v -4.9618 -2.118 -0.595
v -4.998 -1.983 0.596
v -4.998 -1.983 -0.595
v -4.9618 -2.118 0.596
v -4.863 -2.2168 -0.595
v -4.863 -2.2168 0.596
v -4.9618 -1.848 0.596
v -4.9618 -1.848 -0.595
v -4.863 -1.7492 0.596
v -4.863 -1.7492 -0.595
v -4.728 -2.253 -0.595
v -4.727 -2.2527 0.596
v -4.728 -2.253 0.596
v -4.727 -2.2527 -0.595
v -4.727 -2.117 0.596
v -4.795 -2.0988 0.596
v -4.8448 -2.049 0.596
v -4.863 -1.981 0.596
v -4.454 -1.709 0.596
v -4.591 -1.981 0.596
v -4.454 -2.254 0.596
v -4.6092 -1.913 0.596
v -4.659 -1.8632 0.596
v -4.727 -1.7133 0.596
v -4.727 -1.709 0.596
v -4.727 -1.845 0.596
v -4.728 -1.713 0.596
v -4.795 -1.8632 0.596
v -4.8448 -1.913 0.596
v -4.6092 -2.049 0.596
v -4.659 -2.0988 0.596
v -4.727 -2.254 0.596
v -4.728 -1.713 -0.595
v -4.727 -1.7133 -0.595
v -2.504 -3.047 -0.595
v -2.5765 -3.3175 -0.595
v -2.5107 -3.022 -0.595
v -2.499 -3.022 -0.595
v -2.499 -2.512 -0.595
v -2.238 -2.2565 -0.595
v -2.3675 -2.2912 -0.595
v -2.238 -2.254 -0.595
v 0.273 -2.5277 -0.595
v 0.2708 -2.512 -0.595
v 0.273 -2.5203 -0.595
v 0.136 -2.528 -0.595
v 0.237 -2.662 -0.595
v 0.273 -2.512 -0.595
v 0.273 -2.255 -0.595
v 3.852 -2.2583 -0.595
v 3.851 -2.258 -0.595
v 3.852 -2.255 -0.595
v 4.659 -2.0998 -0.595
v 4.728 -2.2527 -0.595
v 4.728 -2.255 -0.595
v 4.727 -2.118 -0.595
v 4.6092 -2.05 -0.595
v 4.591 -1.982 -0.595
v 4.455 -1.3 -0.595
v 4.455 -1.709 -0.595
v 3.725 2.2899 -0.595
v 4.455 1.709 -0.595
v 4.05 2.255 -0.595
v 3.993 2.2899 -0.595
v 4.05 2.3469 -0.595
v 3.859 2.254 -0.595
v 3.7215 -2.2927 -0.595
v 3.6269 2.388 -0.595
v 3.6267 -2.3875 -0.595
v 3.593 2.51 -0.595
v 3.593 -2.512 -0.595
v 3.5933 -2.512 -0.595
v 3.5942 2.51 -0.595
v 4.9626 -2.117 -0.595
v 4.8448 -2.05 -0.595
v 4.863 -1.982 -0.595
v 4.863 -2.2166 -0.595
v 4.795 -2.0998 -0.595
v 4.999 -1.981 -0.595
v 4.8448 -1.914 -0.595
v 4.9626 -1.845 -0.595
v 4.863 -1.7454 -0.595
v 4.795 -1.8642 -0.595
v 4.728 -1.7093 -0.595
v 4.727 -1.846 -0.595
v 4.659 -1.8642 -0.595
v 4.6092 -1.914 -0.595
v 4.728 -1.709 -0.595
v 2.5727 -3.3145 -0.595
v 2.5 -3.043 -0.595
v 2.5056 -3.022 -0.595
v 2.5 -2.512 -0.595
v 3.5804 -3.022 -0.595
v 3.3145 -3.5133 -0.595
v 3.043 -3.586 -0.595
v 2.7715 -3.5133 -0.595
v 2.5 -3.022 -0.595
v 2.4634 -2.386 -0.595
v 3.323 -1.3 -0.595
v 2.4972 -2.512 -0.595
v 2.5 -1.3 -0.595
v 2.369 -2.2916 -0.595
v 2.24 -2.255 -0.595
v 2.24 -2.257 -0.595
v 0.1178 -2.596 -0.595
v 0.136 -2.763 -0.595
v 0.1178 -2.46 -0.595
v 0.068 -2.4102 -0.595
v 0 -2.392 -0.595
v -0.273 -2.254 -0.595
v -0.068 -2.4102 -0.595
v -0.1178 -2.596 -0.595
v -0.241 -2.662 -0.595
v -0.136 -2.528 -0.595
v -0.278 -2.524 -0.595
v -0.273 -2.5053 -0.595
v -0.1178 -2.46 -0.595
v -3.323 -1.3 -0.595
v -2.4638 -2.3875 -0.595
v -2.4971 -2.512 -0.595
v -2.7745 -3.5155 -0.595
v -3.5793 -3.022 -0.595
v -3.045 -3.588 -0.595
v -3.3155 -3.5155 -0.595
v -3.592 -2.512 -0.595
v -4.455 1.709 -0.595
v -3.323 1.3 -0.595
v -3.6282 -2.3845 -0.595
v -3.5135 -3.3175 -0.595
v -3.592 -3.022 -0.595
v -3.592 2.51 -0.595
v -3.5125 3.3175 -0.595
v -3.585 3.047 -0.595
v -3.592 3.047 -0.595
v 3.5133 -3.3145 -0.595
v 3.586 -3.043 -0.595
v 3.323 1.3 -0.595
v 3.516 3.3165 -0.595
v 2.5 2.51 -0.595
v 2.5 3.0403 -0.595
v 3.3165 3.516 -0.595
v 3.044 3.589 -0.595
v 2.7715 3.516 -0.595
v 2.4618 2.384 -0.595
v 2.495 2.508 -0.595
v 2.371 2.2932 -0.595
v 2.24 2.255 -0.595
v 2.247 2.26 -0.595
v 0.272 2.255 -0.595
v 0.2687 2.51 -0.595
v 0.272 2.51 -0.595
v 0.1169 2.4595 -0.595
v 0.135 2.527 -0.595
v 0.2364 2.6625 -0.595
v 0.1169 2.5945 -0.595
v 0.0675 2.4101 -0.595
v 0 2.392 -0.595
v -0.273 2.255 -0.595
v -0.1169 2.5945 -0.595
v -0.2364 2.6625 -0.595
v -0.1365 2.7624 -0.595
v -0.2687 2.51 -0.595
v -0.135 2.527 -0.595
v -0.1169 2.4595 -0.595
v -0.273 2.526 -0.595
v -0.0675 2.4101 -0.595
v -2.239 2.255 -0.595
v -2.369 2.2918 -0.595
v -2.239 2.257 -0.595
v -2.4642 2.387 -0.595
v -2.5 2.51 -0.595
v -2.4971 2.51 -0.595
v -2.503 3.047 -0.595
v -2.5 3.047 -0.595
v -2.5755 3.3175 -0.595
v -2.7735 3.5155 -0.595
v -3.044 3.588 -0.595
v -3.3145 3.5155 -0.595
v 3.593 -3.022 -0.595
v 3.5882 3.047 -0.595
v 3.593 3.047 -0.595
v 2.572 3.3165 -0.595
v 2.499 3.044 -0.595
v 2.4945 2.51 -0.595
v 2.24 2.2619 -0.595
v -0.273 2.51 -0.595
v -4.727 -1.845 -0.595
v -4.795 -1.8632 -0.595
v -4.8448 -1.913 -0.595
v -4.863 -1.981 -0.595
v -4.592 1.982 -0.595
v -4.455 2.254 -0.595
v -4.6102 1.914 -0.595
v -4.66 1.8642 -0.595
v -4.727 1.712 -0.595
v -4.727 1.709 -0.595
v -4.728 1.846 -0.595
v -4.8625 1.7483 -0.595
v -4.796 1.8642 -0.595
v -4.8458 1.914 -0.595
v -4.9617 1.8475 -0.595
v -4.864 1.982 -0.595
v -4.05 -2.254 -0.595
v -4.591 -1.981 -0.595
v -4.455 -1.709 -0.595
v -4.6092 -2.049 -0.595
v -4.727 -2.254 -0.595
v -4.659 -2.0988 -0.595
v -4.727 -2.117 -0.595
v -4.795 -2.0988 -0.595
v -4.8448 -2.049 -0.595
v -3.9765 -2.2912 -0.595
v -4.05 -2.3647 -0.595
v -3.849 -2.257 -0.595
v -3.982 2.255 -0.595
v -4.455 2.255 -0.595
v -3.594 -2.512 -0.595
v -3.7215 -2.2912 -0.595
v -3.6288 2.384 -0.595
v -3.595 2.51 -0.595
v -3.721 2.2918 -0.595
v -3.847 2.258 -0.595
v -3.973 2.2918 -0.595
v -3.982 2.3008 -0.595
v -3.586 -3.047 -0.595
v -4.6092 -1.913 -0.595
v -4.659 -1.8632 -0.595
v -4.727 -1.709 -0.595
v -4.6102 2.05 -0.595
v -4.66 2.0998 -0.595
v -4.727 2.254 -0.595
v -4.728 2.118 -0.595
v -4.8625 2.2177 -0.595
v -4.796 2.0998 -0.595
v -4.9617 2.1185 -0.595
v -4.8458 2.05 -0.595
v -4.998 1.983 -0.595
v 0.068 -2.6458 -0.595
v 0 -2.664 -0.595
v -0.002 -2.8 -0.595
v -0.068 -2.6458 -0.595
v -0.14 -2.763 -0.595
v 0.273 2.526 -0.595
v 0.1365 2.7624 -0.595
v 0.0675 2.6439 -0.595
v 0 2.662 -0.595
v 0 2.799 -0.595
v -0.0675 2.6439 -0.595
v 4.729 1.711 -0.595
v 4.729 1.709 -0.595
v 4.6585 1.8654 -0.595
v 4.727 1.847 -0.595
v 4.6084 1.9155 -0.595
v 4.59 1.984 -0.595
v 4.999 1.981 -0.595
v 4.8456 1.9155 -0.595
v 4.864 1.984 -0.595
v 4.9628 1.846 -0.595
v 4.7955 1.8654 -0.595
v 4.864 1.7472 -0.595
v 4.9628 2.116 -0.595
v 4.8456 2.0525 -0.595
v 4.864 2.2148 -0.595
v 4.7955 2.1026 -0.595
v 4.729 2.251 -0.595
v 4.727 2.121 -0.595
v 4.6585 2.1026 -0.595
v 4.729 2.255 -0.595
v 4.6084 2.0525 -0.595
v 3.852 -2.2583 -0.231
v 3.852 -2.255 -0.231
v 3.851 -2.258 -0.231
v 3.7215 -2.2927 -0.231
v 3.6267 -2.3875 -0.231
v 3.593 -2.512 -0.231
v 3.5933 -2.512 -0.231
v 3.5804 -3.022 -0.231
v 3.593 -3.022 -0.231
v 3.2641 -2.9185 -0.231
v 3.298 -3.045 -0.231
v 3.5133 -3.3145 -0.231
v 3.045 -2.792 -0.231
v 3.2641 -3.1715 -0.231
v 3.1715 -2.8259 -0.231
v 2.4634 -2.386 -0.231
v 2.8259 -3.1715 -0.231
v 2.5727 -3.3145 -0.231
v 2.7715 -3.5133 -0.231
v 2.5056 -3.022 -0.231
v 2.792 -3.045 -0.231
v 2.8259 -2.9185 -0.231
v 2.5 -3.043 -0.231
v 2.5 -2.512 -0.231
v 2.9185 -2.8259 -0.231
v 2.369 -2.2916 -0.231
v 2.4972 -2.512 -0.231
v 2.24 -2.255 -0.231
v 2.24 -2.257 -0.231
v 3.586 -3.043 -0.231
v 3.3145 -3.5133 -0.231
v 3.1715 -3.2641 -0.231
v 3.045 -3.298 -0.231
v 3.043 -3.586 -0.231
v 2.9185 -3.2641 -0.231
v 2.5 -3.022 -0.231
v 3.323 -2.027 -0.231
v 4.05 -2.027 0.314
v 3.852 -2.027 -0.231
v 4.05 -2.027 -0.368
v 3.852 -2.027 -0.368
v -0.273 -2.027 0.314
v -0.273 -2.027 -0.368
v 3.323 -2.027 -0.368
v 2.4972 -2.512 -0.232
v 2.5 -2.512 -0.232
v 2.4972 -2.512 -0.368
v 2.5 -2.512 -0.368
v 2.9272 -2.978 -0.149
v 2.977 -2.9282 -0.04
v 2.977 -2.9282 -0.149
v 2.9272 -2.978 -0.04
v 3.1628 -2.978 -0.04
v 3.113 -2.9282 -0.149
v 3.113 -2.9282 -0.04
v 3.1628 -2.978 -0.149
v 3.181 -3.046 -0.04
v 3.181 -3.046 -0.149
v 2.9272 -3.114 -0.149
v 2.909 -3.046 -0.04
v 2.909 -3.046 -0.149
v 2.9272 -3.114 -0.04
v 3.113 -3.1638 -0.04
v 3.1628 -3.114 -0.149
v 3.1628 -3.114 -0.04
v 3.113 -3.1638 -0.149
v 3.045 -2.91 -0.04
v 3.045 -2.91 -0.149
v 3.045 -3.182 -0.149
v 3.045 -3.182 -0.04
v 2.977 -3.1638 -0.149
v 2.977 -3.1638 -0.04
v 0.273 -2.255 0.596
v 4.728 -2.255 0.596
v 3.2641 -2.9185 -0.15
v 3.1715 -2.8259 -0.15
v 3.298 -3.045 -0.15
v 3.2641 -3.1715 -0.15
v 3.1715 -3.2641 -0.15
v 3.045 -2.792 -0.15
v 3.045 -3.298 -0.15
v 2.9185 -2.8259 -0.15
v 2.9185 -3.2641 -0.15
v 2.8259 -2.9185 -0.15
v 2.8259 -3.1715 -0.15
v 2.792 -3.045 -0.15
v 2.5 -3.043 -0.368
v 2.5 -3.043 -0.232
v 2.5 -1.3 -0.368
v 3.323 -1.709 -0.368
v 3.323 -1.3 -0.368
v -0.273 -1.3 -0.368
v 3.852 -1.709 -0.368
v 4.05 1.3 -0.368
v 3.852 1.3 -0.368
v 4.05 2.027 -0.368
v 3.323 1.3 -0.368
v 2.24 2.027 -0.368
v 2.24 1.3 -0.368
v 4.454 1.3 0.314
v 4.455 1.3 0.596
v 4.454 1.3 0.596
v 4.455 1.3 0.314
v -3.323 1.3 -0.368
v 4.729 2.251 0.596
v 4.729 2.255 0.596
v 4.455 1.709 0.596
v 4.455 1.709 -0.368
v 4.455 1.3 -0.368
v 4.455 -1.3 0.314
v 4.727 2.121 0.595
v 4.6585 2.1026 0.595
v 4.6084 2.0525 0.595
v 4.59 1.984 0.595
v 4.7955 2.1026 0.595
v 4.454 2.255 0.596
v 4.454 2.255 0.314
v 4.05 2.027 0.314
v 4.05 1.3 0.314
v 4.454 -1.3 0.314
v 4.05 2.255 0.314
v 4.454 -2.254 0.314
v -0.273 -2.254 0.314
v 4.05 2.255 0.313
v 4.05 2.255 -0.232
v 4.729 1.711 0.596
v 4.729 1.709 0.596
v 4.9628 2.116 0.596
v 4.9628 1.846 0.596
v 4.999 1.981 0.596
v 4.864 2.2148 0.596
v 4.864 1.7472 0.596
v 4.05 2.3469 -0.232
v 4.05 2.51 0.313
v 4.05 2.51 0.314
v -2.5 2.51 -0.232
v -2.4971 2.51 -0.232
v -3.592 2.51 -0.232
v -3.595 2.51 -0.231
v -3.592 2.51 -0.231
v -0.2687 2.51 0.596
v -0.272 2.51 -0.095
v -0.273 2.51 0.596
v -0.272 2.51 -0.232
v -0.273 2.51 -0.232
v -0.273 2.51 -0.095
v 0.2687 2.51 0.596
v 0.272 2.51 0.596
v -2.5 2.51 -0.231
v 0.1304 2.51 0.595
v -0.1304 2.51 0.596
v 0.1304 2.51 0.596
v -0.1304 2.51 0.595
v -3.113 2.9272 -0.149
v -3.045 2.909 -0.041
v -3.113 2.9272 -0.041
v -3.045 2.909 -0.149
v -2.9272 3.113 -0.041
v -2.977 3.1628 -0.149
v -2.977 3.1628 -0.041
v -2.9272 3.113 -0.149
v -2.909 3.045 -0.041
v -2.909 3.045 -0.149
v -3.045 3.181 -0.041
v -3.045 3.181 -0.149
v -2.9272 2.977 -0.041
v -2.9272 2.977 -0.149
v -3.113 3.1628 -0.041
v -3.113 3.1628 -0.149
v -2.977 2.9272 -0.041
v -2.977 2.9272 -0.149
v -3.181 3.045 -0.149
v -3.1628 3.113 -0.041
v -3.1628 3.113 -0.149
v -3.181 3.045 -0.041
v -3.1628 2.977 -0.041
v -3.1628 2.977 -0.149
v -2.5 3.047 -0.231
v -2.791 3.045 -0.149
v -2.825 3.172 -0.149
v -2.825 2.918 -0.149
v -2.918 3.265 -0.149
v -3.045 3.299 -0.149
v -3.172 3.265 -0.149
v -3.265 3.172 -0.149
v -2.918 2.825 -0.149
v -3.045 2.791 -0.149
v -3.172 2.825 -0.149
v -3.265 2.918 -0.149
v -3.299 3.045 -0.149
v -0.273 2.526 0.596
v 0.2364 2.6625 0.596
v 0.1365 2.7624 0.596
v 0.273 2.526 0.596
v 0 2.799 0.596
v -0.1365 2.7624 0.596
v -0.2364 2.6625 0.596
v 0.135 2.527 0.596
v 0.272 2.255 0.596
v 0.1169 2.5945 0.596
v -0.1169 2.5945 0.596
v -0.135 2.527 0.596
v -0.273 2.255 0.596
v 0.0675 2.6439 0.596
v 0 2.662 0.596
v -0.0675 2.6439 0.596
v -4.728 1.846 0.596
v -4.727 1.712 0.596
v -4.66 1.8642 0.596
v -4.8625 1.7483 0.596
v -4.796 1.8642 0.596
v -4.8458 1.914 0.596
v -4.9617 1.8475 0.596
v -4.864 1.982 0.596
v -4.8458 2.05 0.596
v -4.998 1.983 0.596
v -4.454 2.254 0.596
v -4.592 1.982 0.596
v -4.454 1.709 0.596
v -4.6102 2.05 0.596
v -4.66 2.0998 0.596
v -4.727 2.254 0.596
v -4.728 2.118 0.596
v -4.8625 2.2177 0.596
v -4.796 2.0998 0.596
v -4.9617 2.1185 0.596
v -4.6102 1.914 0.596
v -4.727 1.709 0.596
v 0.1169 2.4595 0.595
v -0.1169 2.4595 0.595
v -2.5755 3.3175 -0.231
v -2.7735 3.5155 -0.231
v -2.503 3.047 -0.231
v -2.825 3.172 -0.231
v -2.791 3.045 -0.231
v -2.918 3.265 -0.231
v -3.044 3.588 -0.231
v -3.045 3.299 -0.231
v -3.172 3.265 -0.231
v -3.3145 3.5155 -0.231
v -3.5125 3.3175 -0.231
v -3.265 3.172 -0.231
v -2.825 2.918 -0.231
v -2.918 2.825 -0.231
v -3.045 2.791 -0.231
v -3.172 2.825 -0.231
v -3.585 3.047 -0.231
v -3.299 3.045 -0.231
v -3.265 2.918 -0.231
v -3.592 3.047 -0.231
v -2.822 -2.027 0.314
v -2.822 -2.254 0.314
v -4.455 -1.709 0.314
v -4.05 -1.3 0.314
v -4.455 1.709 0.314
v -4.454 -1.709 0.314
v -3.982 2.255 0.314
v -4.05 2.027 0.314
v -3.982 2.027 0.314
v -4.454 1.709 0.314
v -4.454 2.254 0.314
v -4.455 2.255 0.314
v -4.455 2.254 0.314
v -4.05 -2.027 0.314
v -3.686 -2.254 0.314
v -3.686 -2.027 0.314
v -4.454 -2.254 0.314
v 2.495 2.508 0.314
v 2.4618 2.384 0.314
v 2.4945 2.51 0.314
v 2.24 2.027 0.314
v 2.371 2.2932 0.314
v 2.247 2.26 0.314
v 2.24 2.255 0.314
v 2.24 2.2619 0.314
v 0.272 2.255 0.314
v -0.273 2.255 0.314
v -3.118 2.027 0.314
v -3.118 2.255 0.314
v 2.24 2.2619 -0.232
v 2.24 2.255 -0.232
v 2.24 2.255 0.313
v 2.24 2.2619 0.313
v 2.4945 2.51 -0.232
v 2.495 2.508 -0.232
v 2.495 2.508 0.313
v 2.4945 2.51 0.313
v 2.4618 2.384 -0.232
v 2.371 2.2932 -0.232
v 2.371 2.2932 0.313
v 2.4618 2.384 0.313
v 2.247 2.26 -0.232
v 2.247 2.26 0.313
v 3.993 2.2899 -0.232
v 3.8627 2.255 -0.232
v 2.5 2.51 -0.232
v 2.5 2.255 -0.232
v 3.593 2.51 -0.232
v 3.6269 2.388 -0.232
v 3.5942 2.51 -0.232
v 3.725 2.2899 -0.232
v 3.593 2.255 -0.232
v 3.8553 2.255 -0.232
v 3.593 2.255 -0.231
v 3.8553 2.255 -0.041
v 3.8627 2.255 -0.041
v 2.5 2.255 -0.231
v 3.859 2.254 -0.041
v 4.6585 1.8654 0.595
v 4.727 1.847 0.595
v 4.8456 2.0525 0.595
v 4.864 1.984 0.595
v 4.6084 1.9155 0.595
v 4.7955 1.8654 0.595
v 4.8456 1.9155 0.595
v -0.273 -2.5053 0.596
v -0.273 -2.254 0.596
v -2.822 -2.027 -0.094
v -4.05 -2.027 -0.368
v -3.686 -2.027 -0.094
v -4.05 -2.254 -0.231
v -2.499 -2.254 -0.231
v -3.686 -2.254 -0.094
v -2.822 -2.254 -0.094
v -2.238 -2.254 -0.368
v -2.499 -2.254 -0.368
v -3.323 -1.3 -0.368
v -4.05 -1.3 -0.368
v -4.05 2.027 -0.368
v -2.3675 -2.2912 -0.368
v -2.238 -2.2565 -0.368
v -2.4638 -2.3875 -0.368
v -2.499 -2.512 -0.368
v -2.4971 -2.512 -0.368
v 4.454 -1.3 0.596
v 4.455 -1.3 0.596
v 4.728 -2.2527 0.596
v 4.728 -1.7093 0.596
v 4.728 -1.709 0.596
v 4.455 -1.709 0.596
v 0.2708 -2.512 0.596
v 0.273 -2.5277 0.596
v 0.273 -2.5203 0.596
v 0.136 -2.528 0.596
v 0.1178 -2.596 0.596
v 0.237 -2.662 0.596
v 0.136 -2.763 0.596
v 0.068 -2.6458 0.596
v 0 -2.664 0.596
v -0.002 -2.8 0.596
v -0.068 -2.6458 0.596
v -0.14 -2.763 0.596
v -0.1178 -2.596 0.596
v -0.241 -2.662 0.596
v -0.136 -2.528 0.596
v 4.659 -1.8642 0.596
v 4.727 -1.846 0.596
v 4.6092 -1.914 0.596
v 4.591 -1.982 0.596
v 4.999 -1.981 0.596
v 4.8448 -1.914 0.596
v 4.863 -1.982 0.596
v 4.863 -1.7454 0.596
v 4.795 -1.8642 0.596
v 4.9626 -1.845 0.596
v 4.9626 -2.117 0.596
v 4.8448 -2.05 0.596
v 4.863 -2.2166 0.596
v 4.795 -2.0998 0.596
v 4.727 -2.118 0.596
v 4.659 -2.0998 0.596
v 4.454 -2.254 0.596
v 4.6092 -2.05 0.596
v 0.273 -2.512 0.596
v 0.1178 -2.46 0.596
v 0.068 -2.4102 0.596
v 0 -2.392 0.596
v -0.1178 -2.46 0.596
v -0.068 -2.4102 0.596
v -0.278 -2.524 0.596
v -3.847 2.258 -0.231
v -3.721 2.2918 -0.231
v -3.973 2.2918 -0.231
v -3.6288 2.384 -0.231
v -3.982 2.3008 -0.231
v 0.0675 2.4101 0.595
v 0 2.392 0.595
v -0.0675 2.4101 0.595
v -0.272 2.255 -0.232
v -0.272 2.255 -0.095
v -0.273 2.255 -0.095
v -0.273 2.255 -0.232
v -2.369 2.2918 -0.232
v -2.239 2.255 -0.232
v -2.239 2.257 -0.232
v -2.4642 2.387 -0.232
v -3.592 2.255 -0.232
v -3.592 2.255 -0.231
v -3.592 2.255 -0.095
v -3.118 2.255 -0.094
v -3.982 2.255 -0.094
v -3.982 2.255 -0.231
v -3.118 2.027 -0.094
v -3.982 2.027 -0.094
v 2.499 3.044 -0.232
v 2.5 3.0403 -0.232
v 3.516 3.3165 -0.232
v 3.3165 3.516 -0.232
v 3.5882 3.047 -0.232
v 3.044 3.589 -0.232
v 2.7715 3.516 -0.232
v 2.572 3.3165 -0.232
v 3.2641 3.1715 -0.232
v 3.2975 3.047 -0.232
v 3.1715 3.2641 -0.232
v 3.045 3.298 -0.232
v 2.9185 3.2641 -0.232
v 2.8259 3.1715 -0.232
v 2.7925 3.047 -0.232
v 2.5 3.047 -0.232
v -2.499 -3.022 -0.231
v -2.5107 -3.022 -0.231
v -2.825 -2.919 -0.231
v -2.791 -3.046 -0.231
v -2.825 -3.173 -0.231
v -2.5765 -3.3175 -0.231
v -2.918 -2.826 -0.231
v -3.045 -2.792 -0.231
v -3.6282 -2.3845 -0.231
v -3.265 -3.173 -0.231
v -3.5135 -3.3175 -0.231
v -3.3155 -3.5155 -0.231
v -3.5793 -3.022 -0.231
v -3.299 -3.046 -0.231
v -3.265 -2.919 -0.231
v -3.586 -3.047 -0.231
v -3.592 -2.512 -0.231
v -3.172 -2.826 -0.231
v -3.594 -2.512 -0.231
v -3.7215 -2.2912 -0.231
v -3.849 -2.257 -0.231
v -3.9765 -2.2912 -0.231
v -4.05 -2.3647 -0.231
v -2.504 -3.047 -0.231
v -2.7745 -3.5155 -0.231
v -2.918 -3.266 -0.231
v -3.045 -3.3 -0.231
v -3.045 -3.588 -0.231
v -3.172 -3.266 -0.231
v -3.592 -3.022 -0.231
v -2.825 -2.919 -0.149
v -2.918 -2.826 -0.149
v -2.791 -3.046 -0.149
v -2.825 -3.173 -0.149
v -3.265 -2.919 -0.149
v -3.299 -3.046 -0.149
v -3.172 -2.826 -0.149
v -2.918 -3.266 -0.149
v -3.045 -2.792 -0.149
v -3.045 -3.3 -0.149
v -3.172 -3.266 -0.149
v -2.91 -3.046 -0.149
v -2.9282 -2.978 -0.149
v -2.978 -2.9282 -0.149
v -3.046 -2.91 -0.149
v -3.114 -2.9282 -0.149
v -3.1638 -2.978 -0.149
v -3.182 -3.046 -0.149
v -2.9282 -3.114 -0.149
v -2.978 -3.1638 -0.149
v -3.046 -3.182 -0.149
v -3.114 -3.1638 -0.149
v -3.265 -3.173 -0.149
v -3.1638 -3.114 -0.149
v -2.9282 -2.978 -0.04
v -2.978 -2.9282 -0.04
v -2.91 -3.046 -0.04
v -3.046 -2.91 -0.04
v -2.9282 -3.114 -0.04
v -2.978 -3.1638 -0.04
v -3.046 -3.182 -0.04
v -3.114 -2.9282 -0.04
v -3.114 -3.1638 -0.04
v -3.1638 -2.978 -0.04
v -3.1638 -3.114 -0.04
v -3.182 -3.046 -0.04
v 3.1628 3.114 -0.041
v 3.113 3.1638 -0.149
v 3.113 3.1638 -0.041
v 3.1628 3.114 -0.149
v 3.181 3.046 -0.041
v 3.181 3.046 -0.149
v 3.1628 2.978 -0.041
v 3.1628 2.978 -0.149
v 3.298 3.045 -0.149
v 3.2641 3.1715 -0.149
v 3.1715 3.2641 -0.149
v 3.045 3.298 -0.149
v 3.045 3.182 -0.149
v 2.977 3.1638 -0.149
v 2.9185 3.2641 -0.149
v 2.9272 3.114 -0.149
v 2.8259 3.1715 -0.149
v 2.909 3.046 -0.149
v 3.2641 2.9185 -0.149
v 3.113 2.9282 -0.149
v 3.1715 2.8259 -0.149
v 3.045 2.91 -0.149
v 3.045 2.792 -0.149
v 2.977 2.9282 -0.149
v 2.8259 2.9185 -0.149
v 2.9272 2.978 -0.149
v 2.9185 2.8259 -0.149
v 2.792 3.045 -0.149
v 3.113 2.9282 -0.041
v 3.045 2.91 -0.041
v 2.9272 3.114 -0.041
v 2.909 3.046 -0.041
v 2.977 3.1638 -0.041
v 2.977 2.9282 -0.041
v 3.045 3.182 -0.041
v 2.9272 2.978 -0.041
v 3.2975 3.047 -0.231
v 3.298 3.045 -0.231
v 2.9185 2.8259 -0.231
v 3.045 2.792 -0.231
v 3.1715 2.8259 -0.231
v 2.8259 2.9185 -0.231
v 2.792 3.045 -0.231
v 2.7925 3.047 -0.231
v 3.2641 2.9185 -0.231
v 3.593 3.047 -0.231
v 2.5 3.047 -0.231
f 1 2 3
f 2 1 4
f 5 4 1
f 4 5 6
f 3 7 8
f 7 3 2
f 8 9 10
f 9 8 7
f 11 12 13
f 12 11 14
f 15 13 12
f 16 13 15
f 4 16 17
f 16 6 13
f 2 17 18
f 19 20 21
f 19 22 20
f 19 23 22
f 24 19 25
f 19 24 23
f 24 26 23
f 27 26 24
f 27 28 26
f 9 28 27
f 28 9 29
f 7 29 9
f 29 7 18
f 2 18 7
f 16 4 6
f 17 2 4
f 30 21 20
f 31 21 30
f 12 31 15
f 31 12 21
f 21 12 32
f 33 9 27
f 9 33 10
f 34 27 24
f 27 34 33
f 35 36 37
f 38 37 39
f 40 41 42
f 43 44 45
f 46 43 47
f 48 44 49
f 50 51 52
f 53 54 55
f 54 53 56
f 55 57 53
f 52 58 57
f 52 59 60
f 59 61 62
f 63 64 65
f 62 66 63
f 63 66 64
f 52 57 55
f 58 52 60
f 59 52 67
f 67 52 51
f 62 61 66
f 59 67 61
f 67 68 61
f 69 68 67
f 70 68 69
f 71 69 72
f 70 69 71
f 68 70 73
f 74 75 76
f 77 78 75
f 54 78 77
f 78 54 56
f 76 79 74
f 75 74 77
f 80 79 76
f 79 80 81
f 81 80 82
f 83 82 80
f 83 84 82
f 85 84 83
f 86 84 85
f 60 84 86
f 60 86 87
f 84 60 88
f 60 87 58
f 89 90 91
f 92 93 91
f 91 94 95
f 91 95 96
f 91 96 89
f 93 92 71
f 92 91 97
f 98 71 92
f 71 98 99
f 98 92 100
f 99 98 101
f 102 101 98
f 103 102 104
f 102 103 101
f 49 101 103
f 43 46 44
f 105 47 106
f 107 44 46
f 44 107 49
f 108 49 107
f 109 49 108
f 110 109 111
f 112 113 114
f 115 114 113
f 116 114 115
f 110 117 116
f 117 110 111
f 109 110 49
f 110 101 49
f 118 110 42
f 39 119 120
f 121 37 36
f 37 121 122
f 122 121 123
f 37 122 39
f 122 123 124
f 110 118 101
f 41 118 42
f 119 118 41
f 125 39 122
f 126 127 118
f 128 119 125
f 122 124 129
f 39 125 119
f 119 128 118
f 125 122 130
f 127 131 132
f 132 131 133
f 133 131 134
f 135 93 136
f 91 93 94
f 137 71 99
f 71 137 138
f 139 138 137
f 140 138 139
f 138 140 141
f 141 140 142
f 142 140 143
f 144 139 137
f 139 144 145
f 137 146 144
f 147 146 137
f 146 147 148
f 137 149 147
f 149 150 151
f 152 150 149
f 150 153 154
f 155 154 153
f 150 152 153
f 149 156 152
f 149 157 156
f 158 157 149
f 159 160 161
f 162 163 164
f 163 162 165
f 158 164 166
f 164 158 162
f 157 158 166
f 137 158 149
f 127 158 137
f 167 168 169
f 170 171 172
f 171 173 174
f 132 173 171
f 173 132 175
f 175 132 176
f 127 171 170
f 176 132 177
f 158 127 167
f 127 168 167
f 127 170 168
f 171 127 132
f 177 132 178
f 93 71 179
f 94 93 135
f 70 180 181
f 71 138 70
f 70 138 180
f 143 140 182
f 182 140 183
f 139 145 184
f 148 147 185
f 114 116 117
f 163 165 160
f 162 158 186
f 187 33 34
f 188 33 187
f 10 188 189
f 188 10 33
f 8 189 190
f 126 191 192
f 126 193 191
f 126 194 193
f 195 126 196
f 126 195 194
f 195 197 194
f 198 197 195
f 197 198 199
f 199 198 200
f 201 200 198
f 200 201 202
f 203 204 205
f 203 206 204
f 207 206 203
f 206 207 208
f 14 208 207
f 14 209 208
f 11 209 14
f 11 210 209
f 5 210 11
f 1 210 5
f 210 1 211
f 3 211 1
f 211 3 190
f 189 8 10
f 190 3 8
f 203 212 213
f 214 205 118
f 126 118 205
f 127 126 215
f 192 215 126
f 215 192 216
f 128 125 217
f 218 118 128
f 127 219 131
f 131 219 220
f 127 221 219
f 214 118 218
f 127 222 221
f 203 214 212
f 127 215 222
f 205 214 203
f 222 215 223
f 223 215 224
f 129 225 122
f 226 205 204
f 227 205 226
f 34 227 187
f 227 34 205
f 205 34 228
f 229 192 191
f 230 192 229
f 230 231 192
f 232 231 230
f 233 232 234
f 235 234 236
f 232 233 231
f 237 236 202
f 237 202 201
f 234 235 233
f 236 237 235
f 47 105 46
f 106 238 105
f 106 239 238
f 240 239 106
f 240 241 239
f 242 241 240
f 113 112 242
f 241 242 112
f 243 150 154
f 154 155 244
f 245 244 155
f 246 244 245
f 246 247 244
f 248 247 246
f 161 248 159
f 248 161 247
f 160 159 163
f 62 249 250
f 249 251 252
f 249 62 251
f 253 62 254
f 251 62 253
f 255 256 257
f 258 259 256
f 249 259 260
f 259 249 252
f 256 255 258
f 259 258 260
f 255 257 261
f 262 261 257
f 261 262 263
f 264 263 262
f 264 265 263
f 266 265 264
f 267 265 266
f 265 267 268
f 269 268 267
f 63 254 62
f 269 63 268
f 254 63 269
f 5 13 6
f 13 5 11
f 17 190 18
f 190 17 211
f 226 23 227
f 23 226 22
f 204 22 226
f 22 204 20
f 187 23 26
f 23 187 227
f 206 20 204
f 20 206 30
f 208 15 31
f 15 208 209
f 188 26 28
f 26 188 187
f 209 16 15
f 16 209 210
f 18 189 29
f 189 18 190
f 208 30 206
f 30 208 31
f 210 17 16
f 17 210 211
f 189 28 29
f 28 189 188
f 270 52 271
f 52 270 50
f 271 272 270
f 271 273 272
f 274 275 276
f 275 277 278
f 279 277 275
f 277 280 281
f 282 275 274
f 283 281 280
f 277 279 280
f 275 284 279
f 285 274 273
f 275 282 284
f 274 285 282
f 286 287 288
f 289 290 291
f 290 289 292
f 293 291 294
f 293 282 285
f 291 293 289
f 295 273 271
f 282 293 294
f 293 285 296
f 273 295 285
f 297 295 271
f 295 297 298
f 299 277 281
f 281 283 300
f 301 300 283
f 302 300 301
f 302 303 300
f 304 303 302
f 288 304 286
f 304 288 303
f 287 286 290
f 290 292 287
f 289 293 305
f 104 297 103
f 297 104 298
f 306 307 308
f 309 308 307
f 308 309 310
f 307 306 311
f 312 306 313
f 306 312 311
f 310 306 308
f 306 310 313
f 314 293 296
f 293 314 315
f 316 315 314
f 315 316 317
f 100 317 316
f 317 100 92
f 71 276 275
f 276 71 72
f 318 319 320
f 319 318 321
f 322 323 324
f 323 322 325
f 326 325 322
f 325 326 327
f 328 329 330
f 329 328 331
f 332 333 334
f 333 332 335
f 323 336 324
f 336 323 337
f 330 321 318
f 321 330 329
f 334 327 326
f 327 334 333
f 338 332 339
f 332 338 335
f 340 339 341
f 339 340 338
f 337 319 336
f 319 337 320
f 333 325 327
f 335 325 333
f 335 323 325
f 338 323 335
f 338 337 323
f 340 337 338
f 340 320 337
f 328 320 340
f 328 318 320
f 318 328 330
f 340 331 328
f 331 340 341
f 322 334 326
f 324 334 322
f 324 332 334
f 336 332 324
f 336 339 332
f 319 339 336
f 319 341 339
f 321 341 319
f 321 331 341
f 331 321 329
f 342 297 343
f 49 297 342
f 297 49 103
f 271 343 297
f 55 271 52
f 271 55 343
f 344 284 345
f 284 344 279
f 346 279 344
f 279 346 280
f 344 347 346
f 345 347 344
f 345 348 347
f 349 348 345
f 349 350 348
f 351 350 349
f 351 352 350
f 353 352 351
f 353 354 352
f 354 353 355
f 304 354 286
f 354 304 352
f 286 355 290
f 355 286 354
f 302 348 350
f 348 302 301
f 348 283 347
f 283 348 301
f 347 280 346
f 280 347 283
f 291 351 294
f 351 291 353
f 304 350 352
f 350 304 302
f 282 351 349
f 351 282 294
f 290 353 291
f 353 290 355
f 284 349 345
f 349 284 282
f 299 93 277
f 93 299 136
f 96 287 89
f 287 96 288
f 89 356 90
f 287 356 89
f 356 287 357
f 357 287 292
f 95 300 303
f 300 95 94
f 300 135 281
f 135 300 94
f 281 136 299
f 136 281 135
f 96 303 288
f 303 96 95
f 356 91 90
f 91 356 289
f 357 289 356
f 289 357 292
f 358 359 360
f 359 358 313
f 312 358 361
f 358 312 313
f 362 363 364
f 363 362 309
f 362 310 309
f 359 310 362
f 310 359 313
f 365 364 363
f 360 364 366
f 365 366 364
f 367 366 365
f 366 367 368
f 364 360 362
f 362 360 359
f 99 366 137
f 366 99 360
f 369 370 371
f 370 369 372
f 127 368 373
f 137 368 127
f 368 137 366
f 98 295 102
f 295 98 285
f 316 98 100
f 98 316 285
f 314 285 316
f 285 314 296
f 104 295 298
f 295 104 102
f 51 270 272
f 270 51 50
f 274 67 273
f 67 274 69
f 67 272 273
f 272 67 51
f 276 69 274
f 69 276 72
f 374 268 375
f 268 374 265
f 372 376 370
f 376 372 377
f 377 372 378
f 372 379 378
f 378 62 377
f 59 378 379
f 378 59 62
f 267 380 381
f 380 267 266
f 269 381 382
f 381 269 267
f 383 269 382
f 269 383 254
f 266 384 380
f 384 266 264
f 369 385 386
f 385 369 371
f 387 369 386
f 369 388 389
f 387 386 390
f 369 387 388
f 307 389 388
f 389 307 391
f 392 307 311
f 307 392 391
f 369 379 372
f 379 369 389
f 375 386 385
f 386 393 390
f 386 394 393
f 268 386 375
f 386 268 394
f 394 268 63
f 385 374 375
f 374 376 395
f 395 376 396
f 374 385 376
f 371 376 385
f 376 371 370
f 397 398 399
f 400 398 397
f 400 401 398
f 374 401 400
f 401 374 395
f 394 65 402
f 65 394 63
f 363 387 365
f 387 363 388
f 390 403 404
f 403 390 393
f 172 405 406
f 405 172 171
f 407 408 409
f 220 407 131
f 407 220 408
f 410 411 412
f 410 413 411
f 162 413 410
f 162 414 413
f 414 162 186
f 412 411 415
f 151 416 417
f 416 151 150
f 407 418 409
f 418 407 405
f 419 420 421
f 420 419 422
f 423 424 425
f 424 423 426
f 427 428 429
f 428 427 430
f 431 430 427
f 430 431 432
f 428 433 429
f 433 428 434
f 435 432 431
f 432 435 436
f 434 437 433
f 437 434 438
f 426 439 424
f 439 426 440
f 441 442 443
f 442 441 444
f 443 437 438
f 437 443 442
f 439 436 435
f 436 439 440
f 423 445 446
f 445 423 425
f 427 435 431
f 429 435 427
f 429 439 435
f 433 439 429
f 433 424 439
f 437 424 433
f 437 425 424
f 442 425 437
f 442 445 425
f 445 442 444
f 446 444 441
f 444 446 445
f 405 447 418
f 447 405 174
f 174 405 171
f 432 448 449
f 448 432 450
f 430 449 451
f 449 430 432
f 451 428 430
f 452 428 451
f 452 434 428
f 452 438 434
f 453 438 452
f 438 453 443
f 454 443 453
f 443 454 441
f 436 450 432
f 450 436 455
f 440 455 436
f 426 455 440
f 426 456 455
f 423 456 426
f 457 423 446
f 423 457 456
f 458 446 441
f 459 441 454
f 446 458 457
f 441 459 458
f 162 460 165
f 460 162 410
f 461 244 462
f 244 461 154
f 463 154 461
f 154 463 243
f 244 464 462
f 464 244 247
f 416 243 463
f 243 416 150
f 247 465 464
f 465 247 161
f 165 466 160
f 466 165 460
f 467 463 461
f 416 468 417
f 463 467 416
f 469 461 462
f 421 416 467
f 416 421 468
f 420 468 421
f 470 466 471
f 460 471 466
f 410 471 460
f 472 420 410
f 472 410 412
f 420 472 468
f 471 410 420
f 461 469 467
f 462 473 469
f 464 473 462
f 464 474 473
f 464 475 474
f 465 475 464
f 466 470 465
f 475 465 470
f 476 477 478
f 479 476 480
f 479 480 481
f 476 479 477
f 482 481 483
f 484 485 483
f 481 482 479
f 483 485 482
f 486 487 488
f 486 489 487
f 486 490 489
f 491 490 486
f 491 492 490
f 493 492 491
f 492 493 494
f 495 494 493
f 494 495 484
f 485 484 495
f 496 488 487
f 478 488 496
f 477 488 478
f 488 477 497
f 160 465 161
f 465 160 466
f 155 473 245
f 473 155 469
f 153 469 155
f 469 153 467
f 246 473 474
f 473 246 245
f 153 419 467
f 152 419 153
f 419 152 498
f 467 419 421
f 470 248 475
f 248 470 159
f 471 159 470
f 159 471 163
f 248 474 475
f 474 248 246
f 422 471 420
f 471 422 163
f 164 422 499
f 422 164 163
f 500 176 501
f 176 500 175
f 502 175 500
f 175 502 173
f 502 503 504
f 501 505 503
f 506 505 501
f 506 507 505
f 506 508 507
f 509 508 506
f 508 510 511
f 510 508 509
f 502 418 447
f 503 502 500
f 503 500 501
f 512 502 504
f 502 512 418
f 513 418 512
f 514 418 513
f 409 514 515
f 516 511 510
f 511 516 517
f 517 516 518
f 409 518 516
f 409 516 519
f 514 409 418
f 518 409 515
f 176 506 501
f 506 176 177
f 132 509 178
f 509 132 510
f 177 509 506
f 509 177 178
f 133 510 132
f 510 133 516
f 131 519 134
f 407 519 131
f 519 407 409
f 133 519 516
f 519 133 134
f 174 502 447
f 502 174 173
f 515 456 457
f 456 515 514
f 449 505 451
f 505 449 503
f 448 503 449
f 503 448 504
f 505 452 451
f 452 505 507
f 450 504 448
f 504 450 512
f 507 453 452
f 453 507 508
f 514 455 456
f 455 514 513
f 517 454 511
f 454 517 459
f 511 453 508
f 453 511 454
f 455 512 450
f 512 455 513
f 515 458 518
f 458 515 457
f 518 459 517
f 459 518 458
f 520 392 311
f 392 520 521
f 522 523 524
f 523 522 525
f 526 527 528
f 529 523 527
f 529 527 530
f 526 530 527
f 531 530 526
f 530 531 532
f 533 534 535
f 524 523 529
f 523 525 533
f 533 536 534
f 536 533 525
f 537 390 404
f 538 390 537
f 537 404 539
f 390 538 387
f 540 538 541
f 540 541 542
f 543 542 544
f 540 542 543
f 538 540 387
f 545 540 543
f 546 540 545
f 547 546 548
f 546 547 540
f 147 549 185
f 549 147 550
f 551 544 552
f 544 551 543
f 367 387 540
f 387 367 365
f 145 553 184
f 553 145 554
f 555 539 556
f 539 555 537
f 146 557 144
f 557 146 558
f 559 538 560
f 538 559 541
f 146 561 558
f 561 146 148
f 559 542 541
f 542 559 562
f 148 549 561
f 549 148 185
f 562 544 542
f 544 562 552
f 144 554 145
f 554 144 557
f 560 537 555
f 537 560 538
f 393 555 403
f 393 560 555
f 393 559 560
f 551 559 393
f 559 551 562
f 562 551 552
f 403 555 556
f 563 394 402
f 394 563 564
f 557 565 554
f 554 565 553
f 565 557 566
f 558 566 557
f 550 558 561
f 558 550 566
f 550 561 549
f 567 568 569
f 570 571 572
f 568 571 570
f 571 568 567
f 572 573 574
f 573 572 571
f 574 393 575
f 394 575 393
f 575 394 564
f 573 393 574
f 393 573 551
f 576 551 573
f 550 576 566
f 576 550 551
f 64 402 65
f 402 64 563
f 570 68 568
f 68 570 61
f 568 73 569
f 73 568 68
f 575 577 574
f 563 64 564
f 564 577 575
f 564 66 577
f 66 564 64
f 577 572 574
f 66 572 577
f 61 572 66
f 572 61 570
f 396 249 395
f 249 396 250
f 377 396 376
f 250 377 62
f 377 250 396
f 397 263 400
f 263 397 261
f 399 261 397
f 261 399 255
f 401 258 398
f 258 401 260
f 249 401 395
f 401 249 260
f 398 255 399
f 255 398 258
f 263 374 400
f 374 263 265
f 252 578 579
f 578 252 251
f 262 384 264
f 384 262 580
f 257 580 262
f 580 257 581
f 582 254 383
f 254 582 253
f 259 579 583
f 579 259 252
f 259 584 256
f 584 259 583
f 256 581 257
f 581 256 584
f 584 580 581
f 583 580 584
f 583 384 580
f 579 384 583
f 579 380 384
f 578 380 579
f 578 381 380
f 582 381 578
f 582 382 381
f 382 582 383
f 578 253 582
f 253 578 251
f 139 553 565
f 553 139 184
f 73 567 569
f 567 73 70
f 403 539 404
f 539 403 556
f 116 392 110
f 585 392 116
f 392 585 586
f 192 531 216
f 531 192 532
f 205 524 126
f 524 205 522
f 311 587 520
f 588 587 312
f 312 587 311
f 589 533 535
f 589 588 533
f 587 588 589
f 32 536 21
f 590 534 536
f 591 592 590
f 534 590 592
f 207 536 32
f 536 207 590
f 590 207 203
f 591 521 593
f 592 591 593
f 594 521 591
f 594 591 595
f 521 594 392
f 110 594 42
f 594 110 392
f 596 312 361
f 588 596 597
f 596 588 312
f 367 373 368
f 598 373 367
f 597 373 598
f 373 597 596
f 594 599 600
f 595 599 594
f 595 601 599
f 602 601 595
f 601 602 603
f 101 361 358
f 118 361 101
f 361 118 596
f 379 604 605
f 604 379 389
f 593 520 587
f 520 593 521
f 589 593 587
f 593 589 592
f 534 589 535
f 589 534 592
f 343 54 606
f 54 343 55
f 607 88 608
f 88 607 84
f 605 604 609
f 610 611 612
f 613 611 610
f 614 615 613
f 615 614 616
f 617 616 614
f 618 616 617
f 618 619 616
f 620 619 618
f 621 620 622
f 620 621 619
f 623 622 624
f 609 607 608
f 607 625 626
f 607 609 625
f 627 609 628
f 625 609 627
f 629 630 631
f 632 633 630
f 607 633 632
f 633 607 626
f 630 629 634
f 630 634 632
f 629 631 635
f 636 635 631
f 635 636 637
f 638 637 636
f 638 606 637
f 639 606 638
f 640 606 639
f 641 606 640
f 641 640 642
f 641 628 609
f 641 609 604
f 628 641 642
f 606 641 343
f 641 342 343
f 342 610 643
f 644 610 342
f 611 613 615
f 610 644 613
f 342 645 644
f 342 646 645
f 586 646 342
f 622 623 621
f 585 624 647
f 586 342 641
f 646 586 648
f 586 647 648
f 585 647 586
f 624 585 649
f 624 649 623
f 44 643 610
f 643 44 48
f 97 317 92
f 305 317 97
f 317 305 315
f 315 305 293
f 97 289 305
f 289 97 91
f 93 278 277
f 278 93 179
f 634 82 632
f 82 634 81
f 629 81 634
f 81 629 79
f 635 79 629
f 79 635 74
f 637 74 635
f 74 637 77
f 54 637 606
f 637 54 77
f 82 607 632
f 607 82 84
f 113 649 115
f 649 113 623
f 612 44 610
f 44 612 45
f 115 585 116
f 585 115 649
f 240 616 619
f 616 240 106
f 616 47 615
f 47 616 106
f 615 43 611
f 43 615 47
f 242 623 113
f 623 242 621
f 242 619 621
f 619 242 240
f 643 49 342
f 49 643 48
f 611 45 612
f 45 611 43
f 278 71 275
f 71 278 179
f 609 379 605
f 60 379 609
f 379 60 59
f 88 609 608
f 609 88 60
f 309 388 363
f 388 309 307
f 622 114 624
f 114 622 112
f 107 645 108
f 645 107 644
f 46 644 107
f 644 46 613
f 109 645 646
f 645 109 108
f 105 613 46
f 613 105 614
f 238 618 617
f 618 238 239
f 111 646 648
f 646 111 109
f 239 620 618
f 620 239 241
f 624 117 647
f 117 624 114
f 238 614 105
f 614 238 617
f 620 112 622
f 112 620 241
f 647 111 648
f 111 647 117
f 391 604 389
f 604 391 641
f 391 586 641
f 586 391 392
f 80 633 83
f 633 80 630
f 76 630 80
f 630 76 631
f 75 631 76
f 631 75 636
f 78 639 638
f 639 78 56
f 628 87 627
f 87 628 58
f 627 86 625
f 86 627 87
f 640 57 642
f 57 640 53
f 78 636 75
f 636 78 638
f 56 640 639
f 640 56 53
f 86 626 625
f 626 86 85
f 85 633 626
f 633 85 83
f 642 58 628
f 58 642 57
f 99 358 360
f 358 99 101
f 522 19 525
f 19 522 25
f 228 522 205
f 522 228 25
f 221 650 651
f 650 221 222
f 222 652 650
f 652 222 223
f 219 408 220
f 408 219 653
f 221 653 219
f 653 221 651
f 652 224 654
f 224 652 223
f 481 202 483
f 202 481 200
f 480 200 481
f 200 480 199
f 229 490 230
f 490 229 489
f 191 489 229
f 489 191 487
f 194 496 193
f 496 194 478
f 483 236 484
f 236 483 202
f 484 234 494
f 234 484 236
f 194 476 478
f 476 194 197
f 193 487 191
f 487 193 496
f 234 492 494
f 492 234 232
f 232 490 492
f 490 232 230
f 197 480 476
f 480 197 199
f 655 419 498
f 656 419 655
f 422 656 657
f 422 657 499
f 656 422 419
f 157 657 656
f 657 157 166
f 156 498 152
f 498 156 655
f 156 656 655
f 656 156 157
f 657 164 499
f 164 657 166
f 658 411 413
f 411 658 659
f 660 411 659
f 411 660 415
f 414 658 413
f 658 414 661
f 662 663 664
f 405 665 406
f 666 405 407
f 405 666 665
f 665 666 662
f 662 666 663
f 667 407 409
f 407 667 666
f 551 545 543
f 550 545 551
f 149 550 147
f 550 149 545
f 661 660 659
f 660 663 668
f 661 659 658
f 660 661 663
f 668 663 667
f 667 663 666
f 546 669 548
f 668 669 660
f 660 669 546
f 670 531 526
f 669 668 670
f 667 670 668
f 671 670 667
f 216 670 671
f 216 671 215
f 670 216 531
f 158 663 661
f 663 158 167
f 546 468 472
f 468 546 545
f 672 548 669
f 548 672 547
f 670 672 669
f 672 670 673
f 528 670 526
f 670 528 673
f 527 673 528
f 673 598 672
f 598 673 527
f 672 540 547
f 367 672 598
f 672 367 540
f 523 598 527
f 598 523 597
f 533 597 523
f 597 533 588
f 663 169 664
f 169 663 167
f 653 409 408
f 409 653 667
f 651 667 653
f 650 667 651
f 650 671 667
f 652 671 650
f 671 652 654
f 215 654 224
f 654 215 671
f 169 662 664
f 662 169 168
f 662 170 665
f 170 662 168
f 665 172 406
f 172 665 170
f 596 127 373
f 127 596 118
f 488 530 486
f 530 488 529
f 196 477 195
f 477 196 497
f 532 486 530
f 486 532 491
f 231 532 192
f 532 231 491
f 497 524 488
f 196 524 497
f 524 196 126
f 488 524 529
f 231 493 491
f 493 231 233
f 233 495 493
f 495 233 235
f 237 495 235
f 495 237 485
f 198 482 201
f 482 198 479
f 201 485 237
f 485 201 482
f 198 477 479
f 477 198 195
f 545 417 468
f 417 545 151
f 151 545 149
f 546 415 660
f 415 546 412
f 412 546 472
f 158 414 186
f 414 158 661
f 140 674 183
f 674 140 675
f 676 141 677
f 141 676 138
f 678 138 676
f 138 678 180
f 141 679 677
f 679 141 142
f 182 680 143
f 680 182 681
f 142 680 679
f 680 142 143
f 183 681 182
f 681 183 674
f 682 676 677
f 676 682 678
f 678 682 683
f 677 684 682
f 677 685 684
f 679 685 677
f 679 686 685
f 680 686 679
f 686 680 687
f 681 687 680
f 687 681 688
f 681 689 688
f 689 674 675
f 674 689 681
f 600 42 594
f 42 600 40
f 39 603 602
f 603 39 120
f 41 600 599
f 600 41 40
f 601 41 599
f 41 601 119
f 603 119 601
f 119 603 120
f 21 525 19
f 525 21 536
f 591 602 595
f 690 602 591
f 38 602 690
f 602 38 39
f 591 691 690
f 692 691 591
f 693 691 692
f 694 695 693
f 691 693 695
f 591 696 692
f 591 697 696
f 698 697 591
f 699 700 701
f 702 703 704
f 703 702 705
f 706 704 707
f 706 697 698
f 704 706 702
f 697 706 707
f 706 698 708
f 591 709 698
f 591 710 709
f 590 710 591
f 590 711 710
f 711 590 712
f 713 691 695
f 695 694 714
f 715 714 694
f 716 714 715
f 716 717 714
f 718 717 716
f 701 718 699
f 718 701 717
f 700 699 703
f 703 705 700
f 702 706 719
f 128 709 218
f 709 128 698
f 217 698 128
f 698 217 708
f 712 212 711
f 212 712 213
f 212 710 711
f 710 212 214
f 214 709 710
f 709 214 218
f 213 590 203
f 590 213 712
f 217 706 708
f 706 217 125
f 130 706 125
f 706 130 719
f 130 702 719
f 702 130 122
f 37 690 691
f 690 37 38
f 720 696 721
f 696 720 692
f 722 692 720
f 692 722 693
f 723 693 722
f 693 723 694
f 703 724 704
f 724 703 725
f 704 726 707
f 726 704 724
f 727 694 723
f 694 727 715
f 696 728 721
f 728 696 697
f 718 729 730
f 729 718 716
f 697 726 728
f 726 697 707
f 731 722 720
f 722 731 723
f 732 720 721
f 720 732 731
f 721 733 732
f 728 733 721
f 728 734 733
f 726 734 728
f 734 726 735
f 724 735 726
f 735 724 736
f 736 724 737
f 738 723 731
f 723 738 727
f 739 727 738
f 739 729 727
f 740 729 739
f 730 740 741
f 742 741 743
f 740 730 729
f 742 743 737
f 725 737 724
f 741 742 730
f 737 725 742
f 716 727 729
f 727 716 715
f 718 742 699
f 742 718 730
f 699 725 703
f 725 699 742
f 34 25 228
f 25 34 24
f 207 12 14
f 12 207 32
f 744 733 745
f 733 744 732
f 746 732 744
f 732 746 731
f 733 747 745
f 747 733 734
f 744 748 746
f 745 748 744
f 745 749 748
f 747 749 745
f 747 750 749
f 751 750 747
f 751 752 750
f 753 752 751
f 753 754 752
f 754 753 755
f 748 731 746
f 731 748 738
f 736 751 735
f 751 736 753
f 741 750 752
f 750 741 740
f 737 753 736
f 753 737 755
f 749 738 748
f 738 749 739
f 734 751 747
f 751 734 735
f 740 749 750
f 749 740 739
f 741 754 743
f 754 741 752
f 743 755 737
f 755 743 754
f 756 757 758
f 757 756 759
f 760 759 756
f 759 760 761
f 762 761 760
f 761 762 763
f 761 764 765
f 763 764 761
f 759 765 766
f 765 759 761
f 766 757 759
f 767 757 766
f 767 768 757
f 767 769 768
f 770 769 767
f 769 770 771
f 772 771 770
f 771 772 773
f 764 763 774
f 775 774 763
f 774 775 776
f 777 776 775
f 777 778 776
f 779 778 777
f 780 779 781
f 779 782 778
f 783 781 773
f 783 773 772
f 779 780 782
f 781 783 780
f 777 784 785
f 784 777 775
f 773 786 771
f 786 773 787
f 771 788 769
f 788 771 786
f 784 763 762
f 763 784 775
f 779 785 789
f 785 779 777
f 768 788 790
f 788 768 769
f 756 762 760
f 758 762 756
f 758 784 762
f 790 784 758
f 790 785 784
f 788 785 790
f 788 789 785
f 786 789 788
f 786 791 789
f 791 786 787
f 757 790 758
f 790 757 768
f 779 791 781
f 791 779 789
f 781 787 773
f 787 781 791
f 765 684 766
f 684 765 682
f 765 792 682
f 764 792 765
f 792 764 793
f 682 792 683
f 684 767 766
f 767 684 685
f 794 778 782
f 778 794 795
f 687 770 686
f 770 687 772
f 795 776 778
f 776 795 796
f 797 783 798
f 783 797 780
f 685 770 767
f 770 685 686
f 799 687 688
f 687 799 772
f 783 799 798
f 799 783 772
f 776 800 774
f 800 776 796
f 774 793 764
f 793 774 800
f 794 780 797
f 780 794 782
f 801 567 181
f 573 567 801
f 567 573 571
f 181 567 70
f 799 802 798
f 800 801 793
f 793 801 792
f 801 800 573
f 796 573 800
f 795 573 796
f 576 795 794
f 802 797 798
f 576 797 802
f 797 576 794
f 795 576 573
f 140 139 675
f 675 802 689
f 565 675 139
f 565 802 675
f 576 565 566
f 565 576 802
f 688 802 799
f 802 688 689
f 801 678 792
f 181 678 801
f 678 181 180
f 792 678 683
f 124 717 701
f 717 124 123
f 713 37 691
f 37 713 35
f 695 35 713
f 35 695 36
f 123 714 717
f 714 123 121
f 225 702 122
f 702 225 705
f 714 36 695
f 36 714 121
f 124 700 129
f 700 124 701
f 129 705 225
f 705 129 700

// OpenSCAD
intersection() {
translate([-6, -4.306, -0.715]) cube(size = [12, 8.611, 1.429], center = false);
union() {
difference() {
translate([-4.728, -1.983, -0.595])
cylinder(h = 1.191, r1 = 0.27, r2 = 0.27, center = false, $fn = 12);
translate([-4.727, -1.981, -18.1])
cylinder(h = 36.2, r1 = 0.136, r2 = 0.136, center = false, $fn = 12);
}
translate([-3.046, -3.046, -0.595])
cylinder(h = 0.555, r1 = 0.136, r2 = 0.136, center = false, $fn = 12);
difference() {
union() {
translate([3.045, -3.045, -0.232])
cylinder(h = 0.082, r1 = 0.253, r2 = 0.253, center = false, $fn = 12);
translate([2.5, -3.022, -0.149]) cube(size = [0.823, 0.51, 0.108], center = false);
translate([3.043, -3.043, -0.595])
cylinder(h = 0.364, r1 = 0.543, r2 = 0.543, center = false, $fn = 12);
intersection() {
union() {
translate([2.24, -2.512, -0.595]) cube(size = [1.612, 0.485, 0.364], center = false);
translate([3.045, -3.046, -0.149])
cylinder(h = 0.745, r1 = 0.136, r2 = 0.136, center = false, $fn = 12);
}
union() {
translate([0.273, -18.1, -0.595]) cube(size = [17.827, 15.845, 0.555], center = false);
translate([3.323, -2.027, -0.595]) cube(size = [14.777, 20.127, 0.364], center = false);
}
}
translate([3.323, -1.709, -0.595]) cube(size = [0.529, 3.009, 0.227], center = false);
}
union() {
difference() {
translate([4.727, -1.982, -0.595])
cylinder(h = 18.695, r1 = 0.136, r2 = 0.136, center = false, $fn = 12);
translate([-0.273, -2.512, -0.595]) cube(size = [5.001, 0.258, 0.446], center = false);
}
translate([2.24, -2.515, -0.595])
cylinder(h = 0.364, r1 = 0.258, r2 = 0.258, center = false, $fn = 12);
difference() {
translate([0.273, -3.022, -0.149]) cube(size = [3.05, 0.51, 18.249], center = false);
translate([3.045, -3.046, -0.368])
cylinder(h = 18.468, r1 = 0.136, r2 = 0.136, center = false, $fn = 12);
}
translate([2.24, -18.1, -0.368]) cube(size = [0.26, 15.588, 0.136], center = false);
translate([3.851, -2.517, -0.595])
cylinder(h = 0.364, r1 = 0.259, r2 = 0.259, center = false, $fn = 12);
}
}
translate([3.045, 3.046, -0.149])
cylinder(h = 0.108, r1 = 0.136, r2 = 0.136, center = false, $fn = 12);
translate([3.045, 3.045, -0.595])
cylinder(h = 0.446, r1 = 0.253, r2 = 0.253, center = false, $fn = 12);
difference() {
translate([4.05, 1.3, -0.595]) cube(size = [0.679, 0.955, 1.191], center = false);
union() {
translate([4.455, -18.1, -0.595]) cube(size = [0.274, 20.127, 18.695], center = false);
translate([-18.1, 1.3, -0.595]) cube(size = [21.693, 0.409, 0.364], center = false);
translate([4.727, 1.984, -18.1])
cylinder(h = 36.2, r1 = 0.137, r2 = 0.137, center = false, $fn = 12);
translate([3.593, 1.3, 0.314]) cube(size = [0.861, 0.955, 17.786], center = false);
}
}
intersection() {
union() {
translate([-0.273, 2.51, -0.595]) cube(size = [18.373, 0.537, 18.695], center = false);
translate([-3.045, 3.045, -0.232])
cylinder(h = 0.191, r1 = 0.136, r2 = 0.136, center = false, $fn = 12);
translate([-4.455, 2.51, -0.595]) cube(size = [1.955, 15.59, 0.446], center = false);
}
union() {
translate([-3.044, 3.047, -0.595])
cylinder(h = 0.364, r1 = 0.541, r2 = 0.541, center = false, $fn = 12);
intersection() {
difference() {
translate([0, 2.526, -0.595])
cylinder(h = 1.191, r1 = 0.273, r2 = 0.273, center = false, $fn = 12);
translate([0, 2.527, -0.595])
cylinder(h = 18.695, r1 = 0.135, r2 = 0.135, center = false, $fn = 12);
}
translate([0, 0, 0]) sphere(r = 54.3, $fn = 12);
}
translate([-3.592, 2.027, -0.595]) cube(size = [1.354, 1.02, 0.364], center = false);
translate([-3.045, 3.045, -0.232])
cylinder(h = 0.191, r1 = 0.254, r2 = 0.254, center = false, $fn = 12);
}
}
translate([3.044, 3.044, -0.595])
cylinder(h = 0.227, r1 = 0.545, r2 = 0.545, center = false, $fn = 12);
intersection() {
union() {
difference() {
difference() {
translate([2.24, 2.027, -0.595]) cube(size = [1.81, 1.02, 0.909], center = false);
translate([2.247, 2.508, -0.595])
cylinder(h = 18.695, r1 = 0.248, r2 = 0.248, center = false, $fn = 12);
}
union() {
translate([2.24, 2.255, -0.232]) cube(size = [1.81, 0.792, 0.545], center = false);
translate([3.859, 2.522, -18.1])
cylinder(h = 18.059, r1 = 0.268, r2 = 0.268, center = false, $fn = 12);
}
}
difference() {
union() {
translate([4.455, 1.709, -0.595]) cube(size = [0.274, 0.318, 1.191], center = false);
translate([4.729, 1.981, -18.1])
cylinder(h = 36.2, r1 = 0.27, r2 = 0.27, center = false, $fn = 12);
}
translate([4.727, 1.984, -18.1])
cylinder(h = 18.695, r1 = 0.137, r2 = 0.137, center = false, $fn = 12);
}
}
translate([-18.1, 1.709, -0.595]) cube(size = [36.2, 0.801, 1.191], center = false);
}
translate([2.5, 2.027, -0.595]) cube(size = [1.093, 1.02, 0.364], center = false);
difference() {
union() {
translate([-4.455, -2.254, -0.595]) cube(size = [4.182, 0.227, 0.909], center = false);
translate([-4.455, -2.027, -0.595]) cube(size = [4.182, 0.727, 0.227], center = false);
}
translate([-3.686, -2.254, -0.094]) cube(size = [0.864, 0.227, 0.408], center = false);
}
difference() {
union() {
translate([-0.273, -2.512, -0.595]) cube(size = [5.001, 1.212, 1.191], center = false);
translate([2.5, -3.022, -0.595]) cube(size = [1.955, 4.322, 0.909], center = false);
translate([4.727, -1.981, -0.595])
cylinder(h = 1.191, r1 = 0.272, r2 = 0.272, center = false, $fn = 12);
translate([-0.002, -2.524, -0.595])
cylinder(h = 1.191, r1 = 0.276, r2 = 0.276, center = false, $fn = 12);
}
union() {
translate([4.455, -1.709, -18.1]) cube(size = [13.646, 0.409, 36.2], center = false);
difference() {
translate([0.273, -18.1, -0.595]) cube(size = [17.827, 15.845, 1.191], center = false);
translate([2.5, -3.022, -0.595]) cube(size = [1.093, 1.313, 0.364], center = false);
}
translate([-18.1, -2.027, -0.368]) cube(size = [22.15, 3.327, 18.468], center = false);
translate([0, -2.528, -0.595])
cylinder(h = 18.695, r1 = 0.136, r2 = 0.136, center = false, $fn = 12);
translate([-0.273, -2.254, 0.314]) cube(size = [4.727, 3.554, 0.282], center = false);
translate([4.727, -1.982, -0.595])
cylinder(h = 18.695, r1 = 0.136, r2 = 0.136, center = false, $fn = 12);
translate([2.5, -1.3, -18.1]) cube(size = [1.093, 2.6, 18.414], center = false);
}
}
translate([-4.455, -2.027, -0.368]) cube(size = [0.405, 0.727, 0.682], center = false);
intersection() {
difference() {
difference() {
difference() {
translate([-18.1, -1.709, -0.595]) cube(size = [20.34, 4.219, 1.191], center = false);
translate([-3.847, 2.51, -18.1])
cylinder(h = 36.2, r1 = 0.252, r2 = 0.252, center = false, $fn = 12);
}
union() {
translate([-4.728, 1.982, -18.1])
cylinder(h = 36.2, r1 = 0.136, r2 = 0.136, center = false, $fn = 12);
translate([0, 2.527, -18.1])
cylinder(h = 18.695, r1 = 0.135, r2 = 0.135, center = false, $fn = 12);
}
}
union() {
translate([-3.592, 2.255, -0.232]) cube(size = [3.32, 0.255, 0.137], center = false);
translate([-3.982, 2.027, -0.094]) cube(size = [0.864, 0.482, 0.408], center = false);
translate([-4.05, -1.709, -0.368]) cube(size = [6.29, 3.736, 18.468], center = false);
}
}
union() {
difference() {
translate([-3.982, 1.3, -0.595]) cube(size = [1.743, 1.21, 0.364], center = false);
translate([-2.239, 2.517, -18.1])
cylinder(h = 36.2, r1 = 0.26, r2 = 0.26, center = false, $fn = 12);
}
translate([-4.455, 1.3, -18.1]) cube(size = [22.555, 0.955, 18.414], center = false);
translate([-4.455, -1.709, -18.1]) cube(size = [1.132, 3.736, 18.414], center = false);
translate([-4.727, 1.709, -0.595]) cube(size = [0.273, 0.545, 18.695], center = false);
translate([-4.727, 1.983, -0.595])
cylinder(h = 1.191, r1 = 0.271, r2 = 0.271, center = false, $fn = 12);
translate([-0.273, 2.255, -0.595]) cube(size = [0.545, 0.255, 1.191], center = false);
}
}
intersection() {
union() {
translate([2.24, 1.3, -0.595]) cube(size = [2.215, 0.727, 0.227], center = false);
translate([3.044, 3.044, -0.368])
cylinder(h = 0.136, r1 = 0.545, r2 = 0.545, center = false, $fn = 12);
}
difference() {
translate([0, 0, 0]) sphere(r = 54.3, $fn = 12);
translate([3.859, 2.522, -18.1])
cylinder(h = 17.505, r1 = 0.268, r2 = 0.268, center = false, $fn = 12);
}
}
difference() {
translate([-3.592, -2.512, -0.595]) cube(size = [1.354, 0.803, 0.227], center = false);
translate([-2.236, -2.519, -18.1])
cylinder(h = 17.732, r1 = 0.263, r2 = 0.263, center = false, $fn = 12);
}
intersection() {
union() {
difference() {
translate([-18.1, -2.254, -18.1]) cube(size = [13.646, 0.545, 36.2], center = false);
translate([-4.727, -1.981, -18.1])
cylinder(h = 36.2, r1 = 0.136, r2 = 0.136, center = false, $fn = 12);
}
translate([-3.045, -3.046, -0.595])
cylinder(h = 0.446, r1 = 0.254, r2 = 0.254, center = false, $fn = 12);
intersection() {
difference() {
translate([-4.727, -18.1, -0.595]) cube(size = [2.228, 16.8, 0.364], center = false);
translate([-3.849, -2.512, -0.595])
cylinder(h = 18.695, r1 = 0.255, r2 = 0.255, center = false, $fn = 12);
}
union() {
translate([-4.05, -2.512, -0.595]) cube(size = [1.551, 0.258, 0.909], center = false);
translate([-3.592, -3.022, -0.595]) cube(size = [1.093, 0.51, 0.364], center = false);
}
}
}
translate([-4.727, -18.1, -0.595]) cube(size = [2.488, 36.2, 1.191], center = false);
}
translate([-3.045, -3.047, -0.595])
cylinder(h = 0.364, r1 = 0.541, r2 = 0.541, center = false, $fn = 12);
}
}
